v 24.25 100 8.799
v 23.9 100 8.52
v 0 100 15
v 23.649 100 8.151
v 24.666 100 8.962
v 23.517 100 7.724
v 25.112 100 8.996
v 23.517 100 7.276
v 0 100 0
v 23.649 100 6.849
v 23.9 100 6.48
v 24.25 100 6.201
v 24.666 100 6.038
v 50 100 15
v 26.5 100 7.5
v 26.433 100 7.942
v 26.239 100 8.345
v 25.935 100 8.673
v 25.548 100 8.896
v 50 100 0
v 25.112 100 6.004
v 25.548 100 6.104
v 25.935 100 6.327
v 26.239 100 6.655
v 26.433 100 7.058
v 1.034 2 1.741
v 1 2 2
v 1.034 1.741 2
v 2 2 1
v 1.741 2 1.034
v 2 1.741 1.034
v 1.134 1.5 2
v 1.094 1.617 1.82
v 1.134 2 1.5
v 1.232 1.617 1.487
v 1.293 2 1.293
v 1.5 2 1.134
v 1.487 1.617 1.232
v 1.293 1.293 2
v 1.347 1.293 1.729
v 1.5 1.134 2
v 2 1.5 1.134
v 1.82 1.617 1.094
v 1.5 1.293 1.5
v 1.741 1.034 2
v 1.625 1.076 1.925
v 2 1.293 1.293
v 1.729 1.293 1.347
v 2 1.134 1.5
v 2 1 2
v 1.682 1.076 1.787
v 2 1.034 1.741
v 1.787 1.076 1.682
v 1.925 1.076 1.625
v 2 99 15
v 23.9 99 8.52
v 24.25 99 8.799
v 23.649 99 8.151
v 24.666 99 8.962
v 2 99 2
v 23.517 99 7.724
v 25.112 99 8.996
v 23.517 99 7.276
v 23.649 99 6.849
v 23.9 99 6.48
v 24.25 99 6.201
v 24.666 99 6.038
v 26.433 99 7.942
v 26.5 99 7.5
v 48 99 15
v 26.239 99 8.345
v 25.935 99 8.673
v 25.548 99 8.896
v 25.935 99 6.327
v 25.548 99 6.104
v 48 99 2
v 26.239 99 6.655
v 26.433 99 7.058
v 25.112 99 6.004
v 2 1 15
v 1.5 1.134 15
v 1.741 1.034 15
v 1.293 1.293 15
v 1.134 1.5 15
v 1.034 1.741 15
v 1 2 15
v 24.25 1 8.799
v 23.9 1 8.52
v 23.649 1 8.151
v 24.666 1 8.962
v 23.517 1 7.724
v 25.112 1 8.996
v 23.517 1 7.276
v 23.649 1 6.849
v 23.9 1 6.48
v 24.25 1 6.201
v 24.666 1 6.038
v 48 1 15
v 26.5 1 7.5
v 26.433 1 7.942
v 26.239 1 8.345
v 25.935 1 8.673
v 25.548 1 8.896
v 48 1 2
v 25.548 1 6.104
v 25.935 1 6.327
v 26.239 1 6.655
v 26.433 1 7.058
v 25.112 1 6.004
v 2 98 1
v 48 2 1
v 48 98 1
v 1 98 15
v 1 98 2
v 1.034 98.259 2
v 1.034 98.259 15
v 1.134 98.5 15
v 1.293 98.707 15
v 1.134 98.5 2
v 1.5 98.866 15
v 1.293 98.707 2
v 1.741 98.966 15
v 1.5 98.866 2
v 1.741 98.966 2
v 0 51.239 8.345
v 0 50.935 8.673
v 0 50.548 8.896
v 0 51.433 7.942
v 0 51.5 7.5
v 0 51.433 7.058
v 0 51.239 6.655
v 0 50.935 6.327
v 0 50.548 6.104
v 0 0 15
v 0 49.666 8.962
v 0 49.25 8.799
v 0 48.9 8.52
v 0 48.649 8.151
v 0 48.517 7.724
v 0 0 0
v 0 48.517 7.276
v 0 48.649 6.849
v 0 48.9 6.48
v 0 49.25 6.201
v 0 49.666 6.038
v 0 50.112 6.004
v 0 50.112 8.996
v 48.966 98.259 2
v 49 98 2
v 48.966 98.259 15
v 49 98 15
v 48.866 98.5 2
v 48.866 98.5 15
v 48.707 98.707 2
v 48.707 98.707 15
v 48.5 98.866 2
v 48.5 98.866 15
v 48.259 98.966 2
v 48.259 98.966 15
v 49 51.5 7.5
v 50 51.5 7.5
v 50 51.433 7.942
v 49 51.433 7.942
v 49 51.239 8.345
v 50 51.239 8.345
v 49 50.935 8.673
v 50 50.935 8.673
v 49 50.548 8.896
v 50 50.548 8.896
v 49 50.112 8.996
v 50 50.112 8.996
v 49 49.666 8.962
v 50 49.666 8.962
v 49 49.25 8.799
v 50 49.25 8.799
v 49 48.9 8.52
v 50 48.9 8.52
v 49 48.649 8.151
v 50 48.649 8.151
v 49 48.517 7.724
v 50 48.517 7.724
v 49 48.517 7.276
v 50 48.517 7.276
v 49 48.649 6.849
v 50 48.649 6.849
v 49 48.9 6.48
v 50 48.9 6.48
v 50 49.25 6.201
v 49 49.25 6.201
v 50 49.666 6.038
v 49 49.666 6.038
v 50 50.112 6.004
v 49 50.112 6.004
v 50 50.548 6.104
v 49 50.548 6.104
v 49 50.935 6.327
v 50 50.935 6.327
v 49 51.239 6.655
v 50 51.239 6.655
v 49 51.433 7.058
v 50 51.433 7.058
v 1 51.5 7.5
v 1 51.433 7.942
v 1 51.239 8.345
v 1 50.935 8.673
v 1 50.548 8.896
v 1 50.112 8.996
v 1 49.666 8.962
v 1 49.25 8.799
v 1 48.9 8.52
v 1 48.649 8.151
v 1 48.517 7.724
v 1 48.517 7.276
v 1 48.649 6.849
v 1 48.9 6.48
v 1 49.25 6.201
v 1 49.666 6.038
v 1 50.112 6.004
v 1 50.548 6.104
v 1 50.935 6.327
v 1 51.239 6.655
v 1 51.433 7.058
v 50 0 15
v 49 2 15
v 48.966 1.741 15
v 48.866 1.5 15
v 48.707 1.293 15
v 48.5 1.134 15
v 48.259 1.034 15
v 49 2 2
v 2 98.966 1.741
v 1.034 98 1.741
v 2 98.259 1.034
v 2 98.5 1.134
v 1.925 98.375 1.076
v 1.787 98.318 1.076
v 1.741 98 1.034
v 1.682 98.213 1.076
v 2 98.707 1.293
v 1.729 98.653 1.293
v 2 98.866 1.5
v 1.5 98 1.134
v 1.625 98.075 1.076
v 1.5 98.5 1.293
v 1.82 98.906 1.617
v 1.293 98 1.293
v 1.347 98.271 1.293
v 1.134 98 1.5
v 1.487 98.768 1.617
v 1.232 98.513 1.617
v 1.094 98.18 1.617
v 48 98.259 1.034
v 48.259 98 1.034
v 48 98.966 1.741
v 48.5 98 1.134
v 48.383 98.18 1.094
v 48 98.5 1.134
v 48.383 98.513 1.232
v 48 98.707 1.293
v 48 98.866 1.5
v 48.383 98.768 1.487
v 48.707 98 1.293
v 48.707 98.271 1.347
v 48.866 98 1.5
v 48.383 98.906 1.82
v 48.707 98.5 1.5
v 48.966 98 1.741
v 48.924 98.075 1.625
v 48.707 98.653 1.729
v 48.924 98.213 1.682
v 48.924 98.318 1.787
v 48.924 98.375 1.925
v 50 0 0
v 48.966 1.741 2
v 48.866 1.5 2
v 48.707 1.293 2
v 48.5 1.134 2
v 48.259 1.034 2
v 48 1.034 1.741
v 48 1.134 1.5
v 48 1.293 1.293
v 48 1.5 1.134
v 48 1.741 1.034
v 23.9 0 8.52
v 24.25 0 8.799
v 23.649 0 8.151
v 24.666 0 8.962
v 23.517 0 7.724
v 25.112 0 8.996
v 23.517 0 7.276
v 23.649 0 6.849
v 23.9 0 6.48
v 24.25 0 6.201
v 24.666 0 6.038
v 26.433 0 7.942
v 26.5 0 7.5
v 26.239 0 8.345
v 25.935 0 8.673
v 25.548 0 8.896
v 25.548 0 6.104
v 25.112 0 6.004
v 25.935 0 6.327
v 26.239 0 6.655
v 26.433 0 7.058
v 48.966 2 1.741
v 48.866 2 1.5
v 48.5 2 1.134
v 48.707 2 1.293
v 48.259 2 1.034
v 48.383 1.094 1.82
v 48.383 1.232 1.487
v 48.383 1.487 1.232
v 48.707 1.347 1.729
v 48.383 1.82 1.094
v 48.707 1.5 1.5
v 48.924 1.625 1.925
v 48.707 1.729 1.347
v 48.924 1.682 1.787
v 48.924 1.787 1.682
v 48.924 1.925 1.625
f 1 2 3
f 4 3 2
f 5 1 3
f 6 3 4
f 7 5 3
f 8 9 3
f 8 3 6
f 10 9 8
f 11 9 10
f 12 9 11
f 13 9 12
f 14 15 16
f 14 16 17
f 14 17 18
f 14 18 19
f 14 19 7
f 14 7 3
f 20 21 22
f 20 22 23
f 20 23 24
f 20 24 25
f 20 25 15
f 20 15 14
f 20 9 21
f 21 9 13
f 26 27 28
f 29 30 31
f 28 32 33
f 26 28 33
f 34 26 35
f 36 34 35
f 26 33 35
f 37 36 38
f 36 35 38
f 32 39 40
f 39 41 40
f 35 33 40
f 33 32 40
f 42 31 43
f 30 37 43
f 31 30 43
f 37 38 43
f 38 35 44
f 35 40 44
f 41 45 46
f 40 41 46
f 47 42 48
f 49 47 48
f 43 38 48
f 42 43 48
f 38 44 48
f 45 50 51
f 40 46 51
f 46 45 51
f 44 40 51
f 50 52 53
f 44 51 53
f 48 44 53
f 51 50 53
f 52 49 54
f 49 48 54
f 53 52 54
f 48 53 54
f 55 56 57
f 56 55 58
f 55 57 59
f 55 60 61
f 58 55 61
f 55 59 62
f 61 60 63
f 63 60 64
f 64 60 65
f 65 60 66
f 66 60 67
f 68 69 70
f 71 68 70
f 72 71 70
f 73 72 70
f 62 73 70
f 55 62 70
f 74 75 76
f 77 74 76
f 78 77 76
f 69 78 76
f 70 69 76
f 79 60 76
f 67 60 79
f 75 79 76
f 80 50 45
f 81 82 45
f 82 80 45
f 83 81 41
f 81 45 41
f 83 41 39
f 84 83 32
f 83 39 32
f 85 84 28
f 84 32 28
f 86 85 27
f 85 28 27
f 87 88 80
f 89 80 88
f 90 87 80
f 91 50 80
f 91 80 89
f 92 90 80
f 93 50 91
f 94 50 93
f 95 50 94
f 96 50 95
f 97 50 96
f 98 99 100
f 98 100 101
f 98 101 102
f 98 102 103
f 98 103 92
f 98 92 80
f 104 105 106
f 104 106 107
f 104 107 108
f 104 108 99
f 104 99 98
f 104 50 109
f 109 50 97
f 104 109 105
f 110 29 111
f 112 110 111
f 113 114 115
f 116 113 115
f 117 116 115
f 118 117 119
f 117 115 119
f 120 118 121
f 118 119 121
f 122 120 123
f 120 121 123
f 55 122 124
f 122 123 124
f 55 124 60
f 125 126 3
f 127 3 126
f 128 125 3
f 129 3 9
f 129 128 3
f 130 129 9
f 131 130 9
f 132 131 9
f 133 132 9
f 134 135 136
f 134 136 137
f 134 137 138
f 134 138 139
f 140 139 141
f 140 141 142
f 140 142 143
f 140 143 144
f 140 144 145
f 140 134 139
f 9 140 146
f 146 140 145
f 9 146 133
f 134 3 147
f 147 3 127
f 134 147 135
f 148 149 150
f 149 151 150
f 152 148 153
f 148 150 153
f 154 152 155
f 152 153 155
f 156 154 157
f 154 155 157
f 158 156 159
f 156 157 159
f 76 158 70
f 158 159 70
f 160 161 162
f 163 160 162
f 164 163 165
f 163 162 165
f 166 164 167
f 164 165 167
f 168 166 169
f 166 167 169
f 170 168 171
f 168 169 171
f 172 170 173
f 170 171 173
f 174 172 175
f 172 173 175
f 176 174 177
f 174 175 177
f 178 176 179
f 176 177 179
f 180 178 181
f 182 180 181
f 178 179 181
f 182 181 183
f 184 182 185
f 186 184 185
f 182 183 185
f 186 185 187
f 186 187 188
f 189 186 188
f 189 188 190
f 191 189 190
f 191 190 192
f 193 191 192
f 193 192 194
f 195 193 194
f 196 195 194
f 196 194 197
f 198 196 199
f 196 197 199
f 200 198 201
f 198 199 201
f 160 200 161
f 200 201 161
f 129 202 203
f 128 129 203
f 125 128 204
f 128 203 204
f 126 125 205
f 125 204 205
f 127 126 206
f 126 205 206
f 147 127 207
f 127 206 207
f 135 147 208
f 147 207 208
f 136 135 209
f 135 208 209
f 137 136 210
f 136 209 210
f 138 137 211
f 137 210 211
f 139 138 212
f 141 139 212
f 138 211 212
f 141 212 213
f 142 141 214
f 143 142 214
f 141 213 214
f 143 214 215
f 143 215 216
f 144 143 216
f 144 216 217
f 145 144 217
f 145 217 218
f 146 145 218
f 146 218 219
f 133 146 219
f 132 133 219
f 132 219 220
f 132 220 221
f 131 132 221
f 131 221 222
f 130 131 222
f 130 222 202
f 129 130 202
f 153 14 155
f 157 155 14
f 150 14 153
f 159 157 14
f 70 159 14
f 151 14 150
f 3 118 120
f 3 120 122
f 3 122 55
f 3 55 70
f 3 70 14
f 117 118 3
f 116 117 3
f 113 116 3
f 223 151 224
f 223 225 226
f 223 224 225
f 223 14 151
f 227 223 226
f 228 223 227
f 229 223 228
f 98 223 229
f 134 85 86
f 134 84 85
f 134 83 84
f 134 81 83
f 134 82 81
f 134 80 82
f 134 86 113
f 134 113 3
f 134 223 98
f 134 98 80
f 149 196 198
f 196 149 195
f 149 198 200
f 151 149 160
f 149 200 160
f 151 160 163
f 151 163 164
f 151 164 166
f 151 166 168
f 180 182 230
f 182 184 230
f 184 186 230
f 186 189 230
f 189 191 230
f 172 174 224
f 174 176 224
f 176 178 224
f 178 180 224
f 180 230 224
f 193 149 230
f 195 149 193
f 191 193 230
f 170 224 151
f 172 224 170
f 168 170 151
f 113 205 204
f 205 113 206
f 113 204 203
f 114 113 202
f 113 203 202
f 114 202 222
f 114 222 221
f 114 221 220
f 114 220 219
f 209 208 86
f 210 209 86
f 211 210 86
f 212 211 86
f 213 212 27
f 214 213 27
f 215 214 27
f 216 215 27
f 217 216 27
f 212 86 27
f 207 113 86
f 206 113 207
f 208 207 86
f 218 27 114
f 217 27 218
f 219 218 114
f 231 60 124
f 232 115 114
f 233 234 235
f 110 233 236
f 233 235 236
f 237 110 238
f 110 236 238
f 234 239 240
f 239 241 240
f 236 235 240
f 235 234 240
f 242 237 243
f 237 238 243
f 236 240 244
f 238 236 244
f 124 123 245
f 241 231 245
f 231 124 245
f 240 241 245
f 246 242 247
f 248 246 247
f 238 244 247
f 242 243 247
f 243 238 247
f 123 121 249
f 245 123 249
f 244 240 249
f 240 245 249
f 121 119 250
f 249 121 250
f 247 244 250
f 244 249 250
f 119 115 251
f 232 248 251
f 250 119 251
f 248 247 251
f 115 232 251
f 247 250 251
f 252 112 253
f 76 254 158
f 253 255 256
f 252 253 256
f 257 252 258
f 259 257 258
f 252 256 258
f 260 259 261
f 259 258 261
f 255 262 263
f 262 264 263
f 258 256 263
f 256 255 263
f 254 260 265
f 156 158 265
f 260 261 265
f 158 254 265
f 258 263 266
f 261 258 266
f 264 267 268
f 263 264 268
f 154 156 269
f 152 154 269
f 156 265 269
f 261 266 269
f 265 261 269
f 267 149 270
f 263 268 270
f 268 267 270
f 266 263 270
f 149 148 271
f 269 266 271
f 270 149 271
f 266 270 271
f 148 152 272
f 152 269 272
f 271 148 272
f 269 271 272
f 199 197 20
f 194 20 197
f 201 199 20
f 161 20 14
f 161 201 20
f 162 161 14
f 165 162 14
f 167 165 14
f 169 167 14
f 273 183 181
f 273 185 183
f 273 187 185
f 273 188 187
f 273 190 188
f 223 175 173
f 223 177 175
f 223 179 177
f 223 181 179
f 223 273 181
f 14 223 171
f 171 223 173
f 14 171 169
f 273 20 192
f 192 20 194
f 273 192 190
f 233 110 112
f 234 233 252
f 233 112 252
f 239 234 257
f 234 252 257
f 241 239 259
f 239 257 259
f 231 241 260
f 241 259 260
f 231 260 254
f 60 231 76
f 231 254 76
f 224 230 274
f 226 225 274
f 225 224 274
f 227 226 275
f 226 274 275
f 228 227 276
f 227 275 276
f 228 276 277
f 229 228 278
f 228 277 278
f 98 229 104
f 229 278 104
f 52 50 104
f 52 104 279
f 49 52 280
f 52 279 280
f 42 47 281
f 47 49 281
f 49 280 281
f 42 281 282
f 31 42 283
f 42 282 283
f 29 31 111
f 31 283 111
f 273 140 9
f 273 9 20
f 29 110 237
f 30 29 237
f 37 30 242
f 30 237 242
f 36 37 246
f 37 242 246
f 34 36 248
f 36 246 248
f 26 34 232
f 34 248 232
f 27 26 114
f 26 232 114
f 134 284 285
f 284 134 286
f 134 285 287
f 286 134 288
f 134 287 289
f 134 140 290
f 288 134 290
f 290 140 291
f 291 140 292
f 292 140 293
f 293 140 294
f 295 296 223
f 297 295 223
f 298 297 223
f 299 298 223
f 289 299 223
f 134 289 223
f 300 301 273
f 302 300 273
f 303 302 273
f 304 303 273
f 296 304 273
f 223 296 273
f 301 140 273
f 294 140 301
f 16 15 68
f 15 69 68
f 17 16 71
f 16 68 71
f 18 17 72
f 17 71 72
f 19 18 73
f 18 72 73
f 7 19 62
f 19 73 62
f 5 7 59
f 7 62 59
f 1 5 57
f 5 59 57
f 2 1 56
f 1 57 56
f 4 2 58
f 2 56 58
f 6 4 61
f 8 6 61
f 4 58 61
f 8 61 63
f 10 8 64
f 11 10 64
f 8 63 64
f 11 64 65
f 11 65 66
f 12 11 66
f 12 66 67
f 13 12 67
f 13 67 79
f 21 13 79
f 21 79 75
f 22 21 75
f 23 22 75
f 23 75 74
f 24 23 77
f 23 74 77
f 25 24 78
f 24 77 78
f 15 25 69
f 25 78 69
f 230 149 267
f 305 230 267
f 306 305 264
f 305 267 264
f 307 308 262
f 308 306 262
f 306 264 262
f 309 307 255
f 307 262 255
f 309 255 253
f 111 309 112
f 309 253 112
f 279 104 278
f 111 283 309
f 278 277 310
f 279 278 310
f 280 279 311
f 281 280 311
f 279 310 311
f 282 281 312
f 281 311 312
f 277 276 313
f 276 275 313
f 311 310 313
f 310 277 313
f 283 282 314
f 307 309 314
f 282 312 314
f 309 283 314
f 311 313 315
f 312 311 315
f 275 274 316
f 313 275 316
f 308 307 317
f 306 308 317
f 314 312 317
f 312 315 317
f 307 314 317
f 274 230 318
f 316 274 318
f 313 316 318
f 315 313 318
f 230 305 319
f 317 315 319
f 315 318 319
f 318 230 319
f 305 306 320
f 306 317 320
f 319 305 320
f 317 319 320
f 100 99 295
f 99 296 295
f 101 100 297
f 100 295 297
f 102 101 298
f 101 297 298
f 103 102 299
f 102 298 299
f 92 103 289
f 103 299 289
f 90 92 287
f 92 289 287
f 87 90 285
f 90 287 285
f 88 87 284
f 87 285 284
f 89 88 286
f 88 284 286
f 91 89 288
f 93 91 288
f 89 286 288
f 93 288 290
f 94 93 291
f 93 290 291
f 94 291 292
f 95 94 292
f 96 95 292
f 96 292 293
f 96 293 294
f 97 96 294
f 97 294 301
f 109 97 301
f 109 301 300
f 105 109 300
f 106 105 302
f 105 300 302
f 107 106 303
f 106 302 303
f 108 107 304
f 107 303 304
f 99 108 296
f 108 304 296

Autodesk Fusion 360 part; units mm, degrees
sketch "Sketch2" plane through (0, 0, 0) normal (0, 1, 0) x (1, 0, 0)
  line L0 (0, 0) -> (50, 0)
  line L1 (50, 0) -> (50, -15)
  line L2 (50, -15) -> (0, -15)
  line L3 (0, -15) -> (0, 0)
  dimension "d15" = 50
  dimension "d16" = 15
extrude "Extrude1" add sketch "Sketch2" along normal blind 100
shell "Shell2" thickness 1 removed faces 1 at (33.3333, 33.3333, 15)
sketch "Sketch3" plane through (0, 0, 0) normal (0, -1, 0) x (1, 0, 0)
  line L0 (50, 15) -> (0, 15)
  line L1 (0, 15) -> (0, 0)
  line L2 (0, 0) -> (50, 0)
  line L3 (50, 0) -> (50, 15)
  circle A0 centre (25, 7.5) radius 1.5
  dimension "d20" = 3
  dimension "d21" = 25
  dimension "d22" = 7.5
extrude "Extrude2" cut sketch "Sketch3" against normal blind 100 contours A0
sketch "Sketch4" plane through (50, 0, 0) normal (1, 0, 0) x (0, 1, 0)
  line L0 (0, 15) -> (0, 0)
  line L1 (0, 0) -> (100, 0)
  line L2 (100, 0) -> (100, 15)
  line L3 (100, 15) -> (0, 15)
  circle A0 centre (50, 7.5) radius 1.5
  dimension "d25" = 3
  dimension "d26" = 50
  dimension "d27" = 7.5
extrude "Extrude3" cut sketch "Sketch4" against normal blind 50 contours A0
fillet "Fillet1" radius 1 3 edges at (1, 99, 8) (1, 50, 1) (25, 99, 1)
fillet "Fillet2" radius 1 3 edges at (1, 1, 8.5) (1.2929, 1, 1.2929) (25.5, 1, 1)
fillet "Fillet3" radius 1 5 edges at (49, 99, 8.5) (49, 98.7071, 1.2929) (49, 50, 1) (49, 1.2929, 1.2929) (49, 1, 8.5)
equation "Length = 100 mm"
equation "Width = 50 mm"
equation "Height = 15 mm"
equation "Wall = 1 mm"
equation "LPos = Length / 2"
equation "WPos = Width / 2"
equation "HPos = Height / 2"
equation "Screw = 3 mm"
equation "d15 = Width"
equation "d16 = Height"
equation "d17 = Length"
equation "d19 = Wall"
equation "d20 = Screw"
equation "d21 = WPos"
equation "d22 = HPos"
equation "d23 = -Length"
equation "d25 = Screw"
equation "d26 = LPos"
equation "d27 = HPos"
equation "d28 = -Width"
equation "Internal_fillet = 1 mm"
equation "d32 = Internal_fillet"
equation "d34 = Internal_fillet"
equation "d36 = Internal_fillet"
